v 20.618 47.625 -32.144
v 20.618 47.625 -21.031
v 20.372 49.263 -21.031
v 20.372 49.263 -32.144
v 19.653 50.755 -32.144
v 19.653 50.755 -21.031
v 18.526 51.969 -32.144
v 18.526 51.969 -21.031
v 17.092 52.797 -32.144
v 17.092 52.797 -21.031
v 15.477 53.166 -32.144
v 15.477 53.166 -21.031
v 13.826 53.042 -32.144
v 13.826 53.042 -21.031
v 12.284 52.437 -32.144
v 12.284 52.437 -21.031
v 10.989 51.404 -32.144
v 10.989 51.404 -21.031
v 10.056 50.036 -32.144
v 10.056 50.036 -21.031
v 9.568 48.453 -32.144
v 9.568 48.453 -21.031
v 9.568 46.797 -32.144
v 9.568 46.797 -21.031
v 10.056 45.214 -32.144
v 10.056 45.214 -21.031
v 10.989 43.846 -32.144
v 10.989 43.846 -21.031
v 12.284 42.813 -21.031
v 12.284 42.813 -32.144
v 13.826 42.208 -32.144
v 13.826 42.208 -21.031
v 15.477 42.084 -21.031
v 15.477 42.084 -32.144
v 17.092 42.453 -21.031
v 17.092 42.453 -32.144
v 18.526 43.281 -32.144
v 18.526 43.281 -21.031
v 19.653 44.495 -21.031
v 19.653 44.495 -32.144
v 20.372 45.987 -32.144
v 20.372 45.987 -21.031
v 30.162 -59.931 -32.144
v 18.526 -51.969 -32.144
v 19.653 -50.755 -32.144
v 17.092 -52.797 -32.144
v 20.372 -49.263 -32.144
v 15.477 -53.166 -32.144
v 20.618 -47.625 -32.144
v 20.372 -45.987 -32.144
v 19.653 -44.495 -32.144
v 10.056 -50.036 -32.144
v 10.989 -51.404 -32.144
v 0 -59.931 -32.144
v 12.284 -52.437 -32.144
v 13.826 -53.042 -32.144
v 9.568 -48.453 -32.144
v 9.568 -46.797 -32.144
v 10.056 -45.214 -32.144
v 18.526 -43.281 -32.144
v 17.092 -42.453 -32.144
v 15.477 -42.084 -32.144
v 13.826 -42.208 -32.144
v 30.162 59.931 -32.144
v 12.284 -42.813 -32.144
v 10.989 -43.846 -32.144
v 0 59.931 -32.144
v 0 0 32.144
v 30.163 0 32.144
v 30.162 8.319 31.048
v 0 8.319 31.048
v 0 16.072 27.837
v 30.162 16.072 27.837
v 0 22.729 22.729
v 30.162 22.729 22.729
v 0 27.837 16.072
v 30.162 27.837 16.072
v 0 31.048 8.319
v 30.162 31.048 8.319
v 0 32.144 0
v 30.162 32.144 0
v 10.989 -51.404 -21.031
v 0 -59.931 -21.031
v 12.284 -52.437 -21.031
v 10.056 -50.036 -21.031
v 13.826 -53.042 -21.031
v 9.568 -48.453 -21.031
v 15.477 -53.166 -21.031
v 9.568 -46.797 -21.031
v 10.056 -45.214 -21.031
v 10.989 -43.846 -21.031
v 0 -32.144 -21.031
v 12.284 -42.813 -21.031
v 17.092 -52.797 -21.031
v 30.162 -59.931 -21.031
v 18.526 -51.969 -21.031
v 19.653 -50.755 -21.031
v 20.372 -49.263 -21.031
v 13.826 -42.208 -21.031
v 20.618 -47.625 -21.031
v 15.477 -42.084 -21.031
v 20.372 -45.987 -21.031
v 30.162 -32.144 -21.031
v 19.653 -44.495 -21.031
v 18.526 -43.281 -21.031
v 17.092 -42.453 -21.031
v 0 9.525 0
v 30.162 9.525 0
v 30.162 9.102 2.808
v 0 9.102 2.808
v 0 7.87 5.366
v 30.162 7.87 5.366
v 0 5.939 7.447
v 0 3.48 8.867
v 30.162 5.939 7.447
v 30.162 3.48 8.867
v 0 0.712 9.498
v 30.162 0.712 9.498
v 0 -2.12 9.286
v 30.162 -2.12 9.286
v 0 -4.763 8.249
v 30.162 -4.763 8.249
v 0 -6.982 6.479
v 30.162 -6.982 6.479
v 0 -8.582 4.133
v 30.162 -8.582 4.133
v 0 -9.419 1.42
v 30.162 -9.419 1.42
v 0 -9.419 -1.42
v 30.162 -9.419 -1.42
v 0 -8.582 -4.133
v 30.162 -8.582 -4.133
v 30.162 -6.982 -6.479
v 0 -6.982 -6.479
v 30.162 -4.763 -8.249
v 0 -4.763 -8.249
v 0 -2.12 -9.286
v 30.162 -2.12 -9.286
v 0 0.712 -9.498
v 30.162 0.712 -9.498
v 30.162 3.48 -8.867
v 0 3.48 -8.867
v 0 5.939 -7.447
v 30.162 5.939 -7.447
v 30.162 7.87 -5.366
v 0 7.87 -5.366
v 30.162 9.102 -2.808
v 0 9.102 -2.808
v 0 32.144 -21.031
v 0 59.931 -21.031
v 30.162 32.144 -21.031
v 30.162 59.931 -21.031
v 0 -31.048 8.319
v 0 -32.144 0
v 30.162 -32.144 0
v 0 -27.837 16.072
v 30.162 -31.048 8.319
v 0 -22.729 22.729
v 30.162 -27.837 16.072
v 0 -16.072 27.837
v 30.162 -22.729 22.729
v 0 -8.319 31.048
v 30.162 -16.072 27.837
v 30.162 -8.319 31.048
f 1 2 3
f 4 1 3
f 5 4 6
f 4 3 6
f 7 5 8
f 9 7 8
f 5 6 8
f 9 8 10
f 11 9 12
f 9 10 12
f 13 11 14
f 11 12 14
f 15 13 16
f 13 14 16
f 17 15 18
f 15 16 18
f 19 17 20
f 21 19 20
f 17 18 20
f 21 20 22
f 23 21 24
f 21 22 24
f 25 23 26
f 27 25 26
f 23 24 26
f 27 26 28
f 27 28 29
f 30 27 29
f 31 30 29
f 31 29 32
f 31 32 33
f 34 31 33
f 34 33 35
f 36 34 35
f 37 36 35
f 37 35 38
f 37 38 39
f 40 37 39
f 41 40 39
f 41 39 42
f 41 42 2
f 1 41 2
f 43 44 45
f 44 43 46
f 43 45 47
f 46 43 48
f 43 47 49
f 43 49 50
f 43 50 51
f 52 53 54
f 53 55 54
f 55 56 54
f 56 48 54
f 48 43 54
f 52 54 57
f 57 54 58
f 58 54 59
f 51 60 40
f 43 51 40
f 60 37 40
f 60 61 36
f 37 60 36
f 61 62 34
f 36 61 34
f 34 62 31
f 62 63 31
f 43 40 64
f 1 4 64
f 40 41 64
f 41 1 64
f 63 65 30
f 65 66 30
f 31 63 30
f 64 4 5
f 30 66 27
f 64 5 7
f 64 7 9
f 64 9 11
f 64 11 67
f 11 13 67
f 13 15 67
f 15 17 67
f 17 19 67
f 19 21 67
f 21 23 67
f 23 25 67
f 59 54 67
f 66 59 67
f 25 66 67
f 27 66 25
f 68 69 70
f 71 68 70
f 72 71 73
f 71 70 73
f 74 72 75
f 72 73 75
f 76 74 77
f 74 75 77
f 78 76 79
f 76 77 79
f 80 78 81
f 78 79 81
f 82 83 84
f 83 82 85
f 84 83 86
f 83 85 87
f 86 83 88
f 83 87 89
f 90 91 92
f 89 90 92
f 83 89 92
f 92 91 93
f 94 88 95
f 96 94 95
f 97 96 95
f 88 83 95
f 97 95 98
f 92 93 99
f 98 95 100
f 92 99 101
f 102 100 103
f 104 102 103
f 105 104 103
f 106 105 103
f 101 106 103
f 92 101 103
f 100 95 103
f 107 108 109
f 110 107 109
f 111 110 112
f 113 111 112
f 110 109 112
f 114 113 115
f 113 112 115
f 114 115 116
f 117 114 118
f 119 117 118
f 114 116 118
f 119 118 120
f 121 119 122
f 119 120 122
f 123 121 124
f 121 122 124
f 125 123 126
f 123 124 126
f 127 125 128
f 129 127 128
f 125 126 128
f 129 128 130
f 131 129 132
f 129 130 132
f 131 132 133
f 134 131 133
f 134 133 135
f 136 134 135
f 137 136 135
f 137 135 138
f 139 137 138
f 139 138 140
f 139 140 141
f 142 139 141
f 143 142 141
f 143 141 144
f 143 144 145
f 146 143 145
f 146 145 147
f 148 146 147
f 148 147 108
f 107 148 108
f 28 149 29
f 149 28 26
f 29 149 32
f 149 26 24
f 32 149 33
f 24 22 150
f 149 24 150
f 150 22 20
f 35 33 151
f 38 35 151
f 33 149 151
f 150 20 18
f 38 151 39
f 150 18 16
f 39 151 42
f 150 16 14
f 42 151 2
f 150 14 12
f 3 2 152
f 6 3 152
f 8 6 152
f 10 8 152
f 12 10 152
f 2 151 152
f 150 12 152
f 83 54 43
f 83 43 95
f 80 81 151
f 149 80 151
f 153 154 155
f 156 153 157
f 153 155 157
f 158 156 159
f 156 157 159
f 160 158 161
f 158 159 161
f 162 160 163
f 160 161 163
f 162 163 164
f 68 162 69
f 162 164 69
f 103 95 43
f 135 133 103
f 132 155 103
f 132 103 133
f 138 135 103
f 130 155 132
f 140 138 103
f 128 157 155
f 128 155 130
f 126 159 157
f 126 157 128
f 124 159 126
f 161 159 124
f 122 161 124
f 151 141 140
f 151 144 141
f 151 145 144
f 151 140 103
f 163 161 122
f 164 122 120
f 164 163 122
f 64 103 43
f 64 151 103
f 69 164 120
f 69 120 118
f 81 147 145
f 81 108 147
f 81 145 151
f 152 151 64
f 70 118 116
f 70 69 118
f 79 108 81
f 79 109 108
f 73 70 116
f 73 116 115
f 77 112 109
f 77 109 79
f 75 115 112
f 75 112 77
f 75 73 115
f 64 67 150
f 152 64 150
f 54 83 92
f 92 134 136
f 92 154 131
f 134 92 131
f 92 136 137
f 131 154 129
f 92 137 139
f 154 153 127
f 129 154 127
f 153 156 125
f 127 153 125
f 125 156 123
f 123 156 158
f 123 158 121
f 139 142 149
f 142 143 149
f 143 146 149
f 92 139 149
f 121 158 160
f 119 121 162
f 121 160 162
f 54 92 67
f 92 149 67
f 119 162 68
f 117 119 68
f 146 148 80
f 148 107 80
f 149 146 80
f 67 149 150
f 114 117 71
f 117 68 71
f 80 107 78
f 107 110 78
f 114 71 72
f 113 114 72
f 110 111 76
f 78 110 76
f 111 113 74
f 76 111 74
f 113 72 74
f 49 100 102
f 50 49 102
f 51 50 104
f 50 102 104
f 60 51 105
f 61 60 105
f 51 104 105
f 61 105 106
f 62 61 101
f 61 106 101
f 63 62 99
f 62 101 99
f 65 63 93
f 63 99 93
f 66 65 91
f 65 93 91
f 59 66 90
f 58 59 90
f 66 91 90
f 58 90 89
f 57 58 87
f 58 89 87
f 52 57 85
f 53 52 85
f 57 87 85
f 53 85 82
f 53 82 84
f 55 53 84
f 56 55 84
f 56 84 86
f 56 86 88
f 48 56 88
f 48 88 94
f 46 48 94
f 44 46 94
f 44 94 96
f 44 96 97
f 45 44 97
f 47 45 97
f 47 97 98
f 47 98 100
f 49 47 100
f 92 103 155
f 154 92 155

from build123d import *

# Parameters (mm, degrees)
F0_W      = 119.8626
F0_H      = 64.2874
F1_DEPTH  = 30.1625
F2_R      = 9.525
F3_DEPTH  = 30.1635
F7_DEPTH  = 30.1635
F8_DEPTH  = 30.1635
F9_R      = 5.55625
F10_DEPTH = 32.1447


with BuildPart() as f1:
    # F0 (on Right) → F1 (new body)
    with BuildSketch(Plane.YZ):
        Rectangle(F0_W, F0_H)
    extrude(amount=F1_DEPTH)

    # F2 (on face) → F3 (cut, through all)
    with BuildSketch(Plane.YZ.offset(30.1625)):
        Circle(F2_R)
    extrude(amount=-F3_DEPTH, mode=Mode.SUBTRACT)

    # F5 (on face) → F7 (cut, through all)
    with BuildSketch(Plane.YZ.offset(30.1625)):
        with BuildLine():
            ThreePointArc((-32.1437, 0), (-22.72902828, 22.7290282049), (-1.062e-07, 32.1437))
            Line((-1.062e-07, 32.1437), (-59.9313, 32.1437))
            Line((-59.9313, 32.1437), (-59.9313, -21.0312))
            Line((-59.9313, -21.0312), (-32.1437, -21.0312))
            Line((-32.1437, -21.0312), (-32.1437, 0))
        make_face()
    extrude(amount=-F7_DEPTH, mode=Mode.SUBTRACT)

    # F6 (on face) → F8 (cut, through all)
    with BuildSketch(Plane.YZ.offset(30.1625)):
        with BuildLine():
            Line((59.9313, 32.1437), (-1.062e-07, 32.1437))
            ThreePointArc((-1.062e-07, 32.1437), (22.7290282049, 22.72902828), (32.1437, 0))
            Line((32.1437, 0), (32.1437, -21.0312))
            Line((32.1437, -21.0312), (59.9313, -21.0312))
            Line((59.9313, -21.0312), (59.9313, 32.1437))
        make_face()
    extrude(amount=-F8_DEPTH, mode=Mode.SUBTRACT)

    # F9 (on Top) → F10 (cut, through all)
    with BuildSketch(Plane.XY):
        with Locations((15.0622, -47.625)):
            Circle(F9_R)
        with Locations((15.0622, 47.625)):
            Circle(F9_R)
    extrude(amount=-F10_DEPTH, mode=Mode.SUBTRACT)


solid = f1.part
